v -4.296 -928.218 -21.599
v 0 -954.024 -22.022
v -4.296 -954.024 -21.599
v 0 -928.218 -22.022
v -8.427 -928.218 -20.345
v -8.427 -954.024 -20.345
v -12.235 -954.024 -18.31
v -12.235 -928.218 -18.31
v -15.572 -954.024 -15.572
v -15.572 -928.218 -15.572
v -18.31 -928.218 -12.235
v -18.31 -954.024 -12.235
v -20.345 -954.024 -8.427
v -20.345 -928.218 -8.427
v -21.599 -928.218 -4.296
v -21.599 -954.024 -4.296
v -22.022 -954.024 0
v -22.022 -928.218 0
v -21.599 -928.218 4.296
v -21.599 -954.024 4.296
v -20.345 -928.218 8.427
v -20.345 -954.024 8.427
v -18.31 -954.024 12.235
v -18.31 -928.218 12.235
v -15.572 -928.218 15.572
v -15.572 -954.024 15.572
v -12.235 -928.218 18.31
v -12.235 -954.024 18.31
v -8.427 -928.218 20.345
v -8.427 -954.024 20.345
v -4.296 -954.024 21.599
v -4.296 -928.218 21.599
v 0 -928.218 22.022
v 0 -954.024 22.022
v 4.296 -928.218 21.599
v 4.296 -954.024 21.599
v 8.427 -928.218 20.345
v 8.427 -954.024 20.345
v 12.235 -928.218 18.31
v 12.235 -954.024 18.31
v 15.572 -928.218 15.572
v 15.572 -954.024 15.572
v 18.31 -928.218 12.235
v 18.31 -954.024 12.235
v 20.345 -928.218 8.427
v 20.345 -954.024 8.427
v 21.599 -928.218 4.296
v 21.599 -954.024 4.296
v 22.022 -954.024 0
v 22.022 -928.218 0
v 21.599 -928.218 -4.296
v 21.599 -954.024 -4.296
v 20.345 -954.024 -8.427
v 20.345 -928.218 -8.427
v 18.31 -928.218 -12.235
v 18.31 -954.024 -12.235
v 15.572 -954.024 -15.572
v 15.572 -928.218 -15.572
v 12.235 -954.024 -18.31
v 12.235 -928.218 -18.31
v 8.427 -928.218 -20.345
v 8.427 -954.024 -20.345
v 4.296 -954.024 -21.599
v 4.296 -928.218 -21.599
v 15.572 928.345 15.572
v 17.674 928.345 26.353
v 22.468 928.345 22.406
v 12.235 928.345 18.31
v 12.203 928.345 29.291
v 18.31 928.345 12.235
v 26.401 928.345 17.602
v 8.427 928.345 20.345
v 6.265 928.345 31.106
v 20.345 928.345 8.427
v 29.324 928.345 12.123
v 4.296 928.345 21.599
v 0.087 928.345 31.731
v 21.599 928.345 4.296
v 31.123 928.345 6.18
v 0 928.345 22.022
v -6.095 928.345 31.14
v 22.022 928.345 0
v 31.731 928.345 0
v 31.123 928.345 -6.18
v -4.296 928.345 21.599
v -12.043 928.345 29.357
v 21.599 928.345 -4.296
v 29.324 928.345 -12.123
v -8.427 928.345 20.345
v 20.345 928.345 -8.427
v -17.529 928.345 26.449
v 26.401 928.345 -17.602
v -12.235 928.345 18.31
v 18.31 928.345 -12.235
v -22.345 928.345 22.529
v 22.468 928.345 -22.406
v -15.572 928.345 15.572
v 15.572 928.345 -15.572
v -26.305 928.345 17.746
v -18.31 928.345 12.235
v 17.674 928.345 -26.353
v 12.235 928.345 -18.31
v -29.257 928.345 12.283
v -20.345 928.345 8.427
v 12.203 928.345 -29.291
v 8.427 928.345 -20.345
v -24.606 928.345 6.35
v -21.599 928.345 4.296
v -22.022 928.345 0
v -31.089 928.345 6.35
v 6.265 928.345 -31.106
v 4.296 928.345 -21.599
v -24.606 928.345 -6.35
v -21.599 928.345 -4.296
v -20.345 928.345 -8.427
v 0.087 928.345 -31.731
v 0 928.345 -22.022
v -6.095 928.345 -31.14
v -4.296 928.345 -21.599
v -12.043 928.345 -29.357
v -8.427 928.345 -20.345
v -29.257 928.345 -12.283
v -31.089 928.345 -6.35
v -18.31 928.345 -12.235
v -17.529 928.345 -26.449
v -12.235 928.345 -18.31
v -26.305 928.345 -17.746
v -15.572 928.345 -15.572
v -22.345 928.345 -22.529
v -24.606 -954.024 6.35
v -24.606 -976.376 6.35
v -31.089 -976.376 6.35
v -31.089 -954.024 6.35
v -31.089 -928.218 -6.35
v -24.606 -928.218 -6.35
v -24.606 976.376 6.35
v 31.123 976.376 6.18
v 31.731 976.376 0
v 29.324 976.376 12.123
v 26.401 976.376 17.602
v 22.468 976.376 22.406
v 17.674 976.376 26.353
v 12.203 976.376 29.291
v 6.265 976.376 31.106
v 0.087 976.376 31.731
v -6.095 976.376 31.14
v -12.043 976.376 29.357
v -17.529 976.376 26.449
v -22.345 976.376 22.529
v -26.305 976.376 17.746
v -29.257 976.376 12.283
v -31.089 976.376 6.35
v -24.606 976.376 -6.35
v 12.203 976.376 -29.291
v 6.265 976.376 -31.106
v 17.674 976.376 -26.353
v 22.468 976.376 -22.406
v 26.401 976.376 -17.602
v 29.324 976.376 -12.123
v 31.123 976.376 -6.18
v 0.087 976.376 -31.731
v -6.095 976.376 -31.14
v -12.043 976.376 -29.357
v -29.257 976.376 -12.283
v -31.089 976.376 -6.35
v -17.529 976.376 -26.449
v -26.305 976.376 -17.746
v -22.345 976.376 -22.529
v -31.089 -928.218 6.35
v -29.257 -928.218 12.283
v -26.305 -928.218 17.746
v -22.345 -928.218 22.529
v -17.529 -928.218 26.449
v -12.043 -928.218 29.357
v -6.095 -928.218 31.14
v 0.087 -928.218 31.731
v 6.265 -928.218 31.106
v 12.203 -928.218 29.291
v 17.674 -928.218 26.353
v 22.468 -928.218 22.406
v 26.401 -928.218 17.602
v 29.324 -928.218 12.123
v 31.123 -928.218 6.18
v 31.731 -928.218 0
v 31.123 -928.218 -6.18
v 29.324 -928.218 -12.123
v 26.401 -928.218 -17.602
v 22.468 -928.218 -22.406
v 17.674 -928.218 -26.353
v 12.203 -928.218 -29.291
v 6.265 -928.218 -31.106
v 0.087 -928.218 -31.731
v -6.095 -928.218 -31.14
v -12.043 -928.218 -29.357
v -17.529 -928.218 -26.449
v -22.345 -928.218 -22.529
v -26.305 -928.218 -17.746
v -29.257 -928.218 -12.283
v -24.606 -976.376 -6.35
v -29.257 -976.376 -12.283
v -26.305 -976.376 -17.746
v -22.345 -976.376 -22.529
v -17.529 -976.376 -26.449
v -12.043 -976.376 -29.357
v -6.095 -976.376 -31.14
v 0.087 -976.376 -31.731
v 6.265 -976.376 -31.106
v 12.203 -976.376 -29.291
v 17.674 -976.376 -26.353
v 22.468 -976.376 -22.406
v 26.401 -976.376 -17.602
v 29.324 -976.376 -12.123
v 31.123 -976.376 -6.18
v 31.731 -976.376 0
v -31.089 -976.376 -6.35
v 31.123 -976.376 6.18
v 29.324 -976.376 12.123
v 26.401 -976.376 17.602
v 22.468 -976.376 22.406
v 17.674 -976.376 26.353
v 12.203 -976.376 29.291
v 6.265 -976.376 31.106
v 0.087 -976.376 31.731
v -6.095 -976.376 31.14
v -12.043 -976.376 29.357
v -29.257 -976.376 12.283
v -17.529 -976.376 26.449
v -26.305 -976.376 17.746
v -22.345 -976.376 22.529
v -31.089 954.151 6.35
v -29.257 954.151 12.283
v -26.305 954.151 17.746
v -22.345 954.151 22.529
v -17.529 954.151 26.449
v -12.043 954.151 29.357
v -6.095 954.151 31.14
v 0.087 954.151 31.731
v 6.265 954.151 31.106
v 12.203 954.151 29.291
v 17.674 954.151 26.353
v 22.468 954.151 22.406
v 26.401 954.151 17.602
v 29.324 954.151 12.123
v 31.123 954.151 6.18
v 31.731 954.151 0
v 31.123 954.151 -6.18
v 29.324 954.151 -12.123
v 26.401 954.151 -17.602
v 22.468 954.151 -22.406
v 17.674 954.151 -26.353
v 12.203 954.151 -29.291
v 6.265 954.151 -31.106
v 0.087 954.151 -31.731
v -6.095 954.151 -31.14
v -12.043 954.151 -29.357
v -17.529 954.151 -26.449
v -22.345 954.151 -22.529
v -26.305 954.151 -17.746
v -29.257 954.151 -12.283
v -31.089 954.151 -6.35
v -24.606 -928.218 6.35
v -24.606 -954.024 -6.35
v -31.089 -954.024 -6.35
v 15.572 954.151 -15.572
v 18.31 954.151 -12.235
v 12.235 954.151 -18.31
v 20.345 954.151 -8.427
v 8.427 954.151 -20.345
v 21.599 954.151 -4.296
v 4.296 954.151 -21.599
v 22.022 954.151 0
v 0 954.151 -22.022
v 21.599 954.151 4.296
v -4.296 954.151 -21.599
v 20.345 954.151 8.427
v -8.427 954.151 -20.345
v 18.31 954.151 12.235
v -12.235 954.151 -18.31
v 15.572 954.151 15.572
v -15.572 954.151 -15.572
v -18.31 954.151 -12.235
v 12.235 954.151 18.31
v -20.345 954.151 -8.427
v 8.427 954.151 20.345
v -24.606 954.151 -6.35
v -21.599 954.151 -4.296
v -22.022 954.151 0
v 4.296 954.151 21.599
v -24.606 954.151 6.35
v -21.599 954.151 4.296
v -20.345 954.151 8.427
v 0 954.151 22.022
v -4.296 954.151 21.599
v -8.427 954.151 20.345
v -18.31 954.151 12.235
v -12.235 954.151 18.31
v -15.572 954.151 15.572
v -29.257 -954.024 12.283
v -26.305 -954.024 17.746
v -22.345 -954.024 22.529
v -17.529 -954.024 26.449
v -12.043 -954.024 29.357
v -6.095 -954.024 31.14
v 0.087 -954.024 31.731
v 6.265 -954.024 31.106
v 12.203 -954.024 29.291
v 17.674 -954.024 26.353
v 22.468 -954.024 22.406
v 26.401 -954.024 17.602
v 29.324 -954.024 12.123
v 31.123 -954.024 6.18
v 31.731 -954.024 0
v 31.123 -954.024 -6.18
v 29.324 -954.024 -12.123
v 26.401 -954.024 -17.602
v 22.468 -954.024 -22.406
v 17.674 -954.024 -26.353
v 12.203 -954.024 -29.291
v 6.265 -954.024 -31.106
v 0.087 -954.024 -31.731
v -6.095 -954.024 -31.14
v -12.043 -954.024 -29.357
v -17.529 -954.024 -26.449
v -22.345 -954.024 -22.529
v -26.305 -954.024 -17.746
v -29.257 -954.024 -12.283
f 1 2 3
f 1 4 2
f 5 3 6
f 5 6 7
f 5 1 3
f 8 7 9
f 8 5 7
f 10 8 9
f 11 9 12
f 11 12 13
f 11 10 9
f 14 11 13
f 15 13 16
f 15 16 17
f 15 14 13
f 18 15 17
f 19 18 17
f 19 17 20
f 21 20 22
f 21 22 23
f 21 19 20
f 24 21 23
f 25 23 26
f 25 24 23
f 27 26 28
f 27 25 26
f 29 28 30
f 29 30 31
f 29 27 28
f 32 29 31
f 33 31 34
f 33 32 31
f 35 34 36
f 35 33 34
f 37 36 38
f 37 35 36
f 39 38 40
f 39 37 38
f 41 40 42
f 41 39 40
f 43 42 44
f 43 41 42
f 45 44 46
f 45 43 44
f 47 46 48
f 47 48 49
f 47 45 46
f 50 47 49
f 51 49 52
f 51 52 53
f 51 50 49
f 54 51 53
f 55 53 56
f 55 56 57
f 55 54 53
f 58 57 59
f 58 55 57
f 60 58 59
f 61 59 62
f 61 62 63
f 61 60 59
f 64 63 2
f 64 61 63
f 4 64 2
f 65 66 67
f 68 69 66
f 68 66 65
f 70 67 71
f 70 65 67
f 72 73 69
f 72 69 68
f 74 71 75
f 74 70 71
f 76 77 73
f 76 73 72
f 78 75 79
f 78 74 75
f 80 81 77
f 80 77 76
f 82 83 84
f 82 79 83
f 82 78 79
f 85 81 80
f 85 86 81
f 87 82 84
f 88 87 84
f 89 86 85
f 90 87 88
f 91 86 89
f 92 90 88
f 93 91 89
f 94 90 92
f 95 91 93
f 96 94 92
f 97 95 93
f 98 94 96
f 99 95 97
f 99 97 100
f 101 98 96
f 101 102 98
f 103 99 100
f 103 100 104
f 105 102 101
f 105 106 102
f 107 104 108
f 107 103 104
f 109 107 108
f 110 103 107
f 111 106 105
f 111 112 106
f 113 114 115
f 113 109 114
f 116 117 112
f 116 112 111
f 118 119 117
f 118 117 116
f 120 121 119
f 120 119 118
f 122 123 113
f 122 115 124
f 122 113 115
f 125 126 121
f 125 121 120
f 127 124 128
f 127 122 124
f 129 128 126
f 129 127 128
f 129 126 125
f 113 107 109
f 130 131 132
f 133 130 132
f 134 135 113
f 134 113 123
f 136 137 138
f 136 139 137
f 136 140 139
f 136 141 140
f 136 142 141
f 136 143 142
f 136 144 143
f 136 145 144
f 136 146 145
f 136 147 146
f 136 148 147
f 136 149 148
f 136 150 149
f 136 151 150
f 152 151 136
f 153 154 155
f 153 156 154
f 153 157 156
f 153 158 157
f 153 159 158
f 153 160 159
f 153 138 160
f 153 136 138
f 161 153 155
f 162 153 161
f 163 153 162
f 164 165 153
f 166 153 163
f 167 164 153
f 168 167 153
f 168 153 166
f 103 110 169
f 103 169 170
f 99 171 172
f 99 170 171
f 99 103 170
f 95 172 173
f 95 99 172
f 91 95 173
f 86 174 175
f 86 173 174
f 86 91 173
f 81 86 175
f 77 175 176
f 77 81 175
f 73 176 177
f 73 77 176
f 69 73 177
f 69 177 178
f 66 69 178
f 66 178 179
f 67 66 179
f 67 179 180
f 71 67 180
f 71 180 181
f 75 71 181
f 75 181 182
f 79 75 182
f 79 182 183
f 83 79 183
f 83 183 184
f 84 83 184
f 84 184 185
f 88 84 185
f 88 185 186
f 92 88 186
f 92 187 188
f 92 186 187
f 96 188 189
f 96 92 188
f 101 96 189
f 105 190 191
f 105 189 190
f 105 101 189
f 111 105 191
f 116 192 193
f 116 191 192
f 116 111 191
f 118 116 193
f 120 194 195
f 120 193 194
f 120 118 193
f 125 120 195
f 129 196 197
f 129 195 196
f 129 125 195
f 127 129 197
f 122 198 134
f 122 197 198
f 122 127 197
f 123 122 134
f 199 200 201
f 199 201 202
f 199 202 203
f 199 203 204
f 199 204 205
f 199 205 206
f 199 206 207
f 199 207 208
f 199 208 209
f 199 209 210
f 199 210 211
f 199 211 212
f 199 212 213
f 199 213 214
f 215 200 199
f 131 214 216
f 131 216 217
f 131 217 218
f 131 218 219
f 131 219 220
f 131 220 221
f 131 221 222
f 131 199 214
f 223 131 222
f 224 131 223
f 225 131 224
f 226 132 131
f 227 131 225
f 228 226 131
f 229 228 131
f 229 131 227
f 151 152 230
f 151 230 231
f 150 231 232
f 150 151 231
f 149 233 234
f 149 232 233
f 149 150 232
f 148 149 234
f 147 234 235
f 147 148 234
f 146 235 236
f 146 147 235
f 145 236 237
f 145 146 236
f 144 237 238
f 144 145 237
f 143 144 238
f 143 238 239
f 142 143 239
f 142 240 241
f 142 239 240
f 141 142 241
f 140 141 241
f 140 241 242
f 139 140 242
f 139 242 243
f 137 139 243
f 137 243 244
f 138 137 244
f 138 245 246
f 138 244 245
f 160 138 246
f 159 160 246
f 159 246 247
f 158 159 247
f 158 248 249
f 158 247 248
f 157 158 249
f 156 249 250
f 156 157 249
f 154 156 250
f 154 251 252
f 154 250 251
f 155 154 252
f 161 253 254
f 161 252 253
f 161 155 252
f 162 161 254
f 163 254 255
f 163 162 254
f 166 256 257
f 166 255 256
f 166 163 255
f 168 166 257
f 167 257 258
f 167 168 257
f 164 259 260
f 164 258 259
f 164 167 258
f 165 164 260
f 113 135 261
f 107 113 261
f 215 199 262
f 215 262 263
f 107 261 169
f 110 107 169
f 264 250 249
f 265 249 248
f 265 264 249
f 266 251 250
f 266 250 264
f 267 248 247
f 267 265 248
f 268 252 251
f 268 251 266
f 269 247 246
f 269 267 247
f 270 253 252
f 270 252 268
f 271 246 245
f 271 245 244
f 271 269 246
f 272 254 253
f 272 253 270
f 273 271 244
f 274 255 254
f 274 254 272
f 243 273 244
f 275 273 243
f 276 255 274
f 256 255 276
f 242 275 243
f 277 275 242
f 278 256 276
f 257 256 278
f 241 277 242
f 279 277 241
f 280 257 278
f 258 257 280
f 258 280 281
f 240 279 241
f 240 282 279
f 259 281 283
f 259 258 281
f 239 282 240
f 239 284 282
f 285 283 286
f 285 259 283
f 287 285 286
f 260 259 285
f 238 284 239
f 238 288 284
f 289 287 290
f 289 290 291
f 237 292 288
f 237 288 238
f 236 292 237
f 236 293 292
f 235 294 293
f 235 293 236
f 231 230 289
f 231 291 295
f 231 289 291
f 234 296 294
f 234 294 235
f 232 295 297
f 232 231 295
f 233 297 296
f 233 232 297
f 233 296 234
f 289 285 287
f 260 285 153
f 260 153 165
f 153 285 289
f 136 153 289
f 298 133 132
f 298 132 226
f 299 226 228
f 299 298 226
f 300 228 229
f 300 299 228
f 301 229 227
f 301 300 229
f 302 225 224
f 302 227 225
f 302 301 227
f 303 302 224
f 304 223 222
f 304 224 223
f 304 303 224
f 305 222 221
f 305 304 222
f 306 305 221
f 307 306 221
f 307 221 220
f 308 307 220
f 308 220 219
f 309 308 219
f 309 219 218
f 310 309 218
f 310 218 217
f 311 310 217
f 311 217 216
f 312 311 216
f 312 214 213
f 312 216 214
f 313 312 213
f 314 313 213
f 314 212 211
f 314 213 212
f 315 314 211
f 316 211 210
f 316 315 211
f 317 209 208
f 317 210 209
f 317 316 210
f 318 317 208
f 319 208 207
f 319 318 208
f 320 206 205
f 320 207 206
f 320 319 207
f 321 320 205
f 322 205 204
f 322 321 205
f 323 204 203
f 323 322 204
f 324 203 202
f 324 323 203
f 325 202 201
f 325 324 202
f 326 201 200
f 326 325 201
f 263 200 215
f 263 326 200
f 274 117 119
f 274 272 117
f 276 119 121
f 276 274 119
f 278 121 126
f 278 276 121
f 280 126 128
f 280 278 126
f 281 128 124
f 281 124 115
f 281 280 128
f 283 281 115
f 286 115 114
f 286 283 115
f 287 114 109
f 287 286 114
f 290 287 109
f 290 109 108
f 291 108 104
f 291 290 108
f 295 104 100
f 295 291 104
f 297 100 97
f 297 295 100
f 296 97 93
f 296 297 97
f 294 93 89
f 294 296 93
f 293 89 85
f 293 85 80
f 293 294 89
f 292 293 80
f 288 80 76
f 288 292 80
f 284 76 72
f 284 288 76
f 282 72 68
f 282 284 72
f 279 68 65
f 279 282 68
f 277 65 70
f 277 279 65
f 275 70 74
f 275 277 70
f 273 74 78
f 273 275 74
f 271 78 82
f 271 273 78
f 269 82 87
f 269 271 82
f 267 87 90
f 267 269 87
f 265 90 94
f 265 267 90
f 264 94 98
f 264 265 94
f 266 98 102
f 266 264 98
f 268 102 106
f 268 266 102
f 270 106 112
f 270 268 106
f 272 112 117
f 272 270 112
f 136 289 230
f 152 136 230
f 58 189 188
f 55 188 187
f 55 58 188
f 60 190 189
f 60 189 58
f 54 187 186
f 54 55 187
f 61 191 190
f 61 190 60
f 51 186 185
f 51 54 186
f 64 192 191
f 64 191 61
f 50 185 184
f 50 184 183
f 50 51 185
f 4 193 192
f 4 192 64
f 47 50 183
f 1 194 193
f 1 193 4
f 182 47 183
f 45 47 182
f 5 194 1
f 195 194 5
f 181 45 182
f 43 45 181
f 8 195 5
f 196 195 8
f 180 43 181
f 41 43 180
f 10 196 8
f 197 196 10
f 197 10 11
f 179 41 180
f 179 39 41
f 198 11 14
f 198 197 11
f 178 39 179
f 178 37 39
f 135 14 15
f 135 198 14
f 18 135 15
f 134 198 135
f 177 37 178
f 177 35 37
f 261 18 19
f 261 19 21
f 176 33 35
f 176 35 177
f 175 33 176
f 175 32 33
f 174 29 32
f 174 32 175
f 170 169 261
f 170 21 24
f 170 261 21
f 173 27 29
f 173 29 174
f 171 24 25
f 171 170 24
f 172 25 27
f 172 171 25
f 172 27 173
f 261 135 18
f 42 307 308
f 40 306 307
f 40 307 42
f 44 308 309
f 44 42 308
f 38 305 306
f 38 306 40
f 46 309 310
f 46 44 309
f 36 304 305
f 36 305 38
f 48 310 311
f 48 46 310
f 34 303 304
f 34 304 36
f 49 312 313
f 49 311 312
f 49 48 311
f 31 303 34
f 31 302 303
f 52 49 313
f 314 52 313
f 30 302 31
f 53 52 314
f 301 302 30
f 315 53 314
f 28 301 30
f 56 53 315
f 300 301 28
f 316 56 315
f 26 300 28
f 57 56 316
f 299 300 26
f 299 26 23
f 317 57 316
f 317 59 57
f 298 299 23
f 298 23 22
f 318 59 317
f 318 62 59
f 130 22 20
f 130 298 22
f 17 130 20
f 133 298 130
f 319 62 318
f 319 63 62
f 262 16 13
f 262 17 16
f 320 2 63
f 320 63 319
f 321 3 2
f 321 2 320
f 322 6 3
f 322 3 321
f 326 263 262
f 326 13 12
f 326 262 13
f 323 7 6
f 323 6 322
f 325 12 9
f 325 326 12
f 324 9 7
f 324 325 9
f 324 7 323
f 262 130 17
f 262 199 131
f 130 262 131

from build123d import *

# Parameters (mm, degrees)
CUT_EXTRUDE2_START = -998.728
SKETCH2_W          = 63.4619
SKETCH2_H          = 12.7
CUT_EXTRUDE2_DEPTH = 1997.456


with BuildPart() as part:
    # Sketch1 → Revolve1 (revolve)
    with BuildSketch(Plane(origin=(0, 0, 0), x_dir=(0, 1, 0), z_dir=(0, 0, 1)), mode=Mode.PRIVATE) as revolve1_sk:
        Polygon((-976.376, 0), (-976.376, 31.73095), (-954.024, 31.73095), (-954.024, 22.0218), (-928.2176, 22.0218), (-928.2176, 31.73095), (928.3446, 31.73095), (928.3446, 22.0218), (954.151, 22.0218), (954.151, 31.73095), (976.376, 31.73095), (976.376, 0), align=None)
    revolve(revolve1_sk.sketch.rotate(Axis((0, -1001.776, 0), (0, 1, 0)), 270), axis=Axis((0, -1001.776, 0), (0, 1, 0)))

    # Sketch2 → Cut-Extrude2 (cut)
    with BuildSketch(Plane(origin=(0, 0, 0), x_dir=(-1, 0, 0), z_dir=(0, 1, 0)).offset(CUT_EXTRUDE2_START)):
        with Locations((56.3372, 0)):
            Rectangle(SKETCH2_W, SKETCH2_H)
    extrude(amount=CUT_EXTRUDE2_DEPTH, mode=Mode.SUBTRACT)


solid = part.part
